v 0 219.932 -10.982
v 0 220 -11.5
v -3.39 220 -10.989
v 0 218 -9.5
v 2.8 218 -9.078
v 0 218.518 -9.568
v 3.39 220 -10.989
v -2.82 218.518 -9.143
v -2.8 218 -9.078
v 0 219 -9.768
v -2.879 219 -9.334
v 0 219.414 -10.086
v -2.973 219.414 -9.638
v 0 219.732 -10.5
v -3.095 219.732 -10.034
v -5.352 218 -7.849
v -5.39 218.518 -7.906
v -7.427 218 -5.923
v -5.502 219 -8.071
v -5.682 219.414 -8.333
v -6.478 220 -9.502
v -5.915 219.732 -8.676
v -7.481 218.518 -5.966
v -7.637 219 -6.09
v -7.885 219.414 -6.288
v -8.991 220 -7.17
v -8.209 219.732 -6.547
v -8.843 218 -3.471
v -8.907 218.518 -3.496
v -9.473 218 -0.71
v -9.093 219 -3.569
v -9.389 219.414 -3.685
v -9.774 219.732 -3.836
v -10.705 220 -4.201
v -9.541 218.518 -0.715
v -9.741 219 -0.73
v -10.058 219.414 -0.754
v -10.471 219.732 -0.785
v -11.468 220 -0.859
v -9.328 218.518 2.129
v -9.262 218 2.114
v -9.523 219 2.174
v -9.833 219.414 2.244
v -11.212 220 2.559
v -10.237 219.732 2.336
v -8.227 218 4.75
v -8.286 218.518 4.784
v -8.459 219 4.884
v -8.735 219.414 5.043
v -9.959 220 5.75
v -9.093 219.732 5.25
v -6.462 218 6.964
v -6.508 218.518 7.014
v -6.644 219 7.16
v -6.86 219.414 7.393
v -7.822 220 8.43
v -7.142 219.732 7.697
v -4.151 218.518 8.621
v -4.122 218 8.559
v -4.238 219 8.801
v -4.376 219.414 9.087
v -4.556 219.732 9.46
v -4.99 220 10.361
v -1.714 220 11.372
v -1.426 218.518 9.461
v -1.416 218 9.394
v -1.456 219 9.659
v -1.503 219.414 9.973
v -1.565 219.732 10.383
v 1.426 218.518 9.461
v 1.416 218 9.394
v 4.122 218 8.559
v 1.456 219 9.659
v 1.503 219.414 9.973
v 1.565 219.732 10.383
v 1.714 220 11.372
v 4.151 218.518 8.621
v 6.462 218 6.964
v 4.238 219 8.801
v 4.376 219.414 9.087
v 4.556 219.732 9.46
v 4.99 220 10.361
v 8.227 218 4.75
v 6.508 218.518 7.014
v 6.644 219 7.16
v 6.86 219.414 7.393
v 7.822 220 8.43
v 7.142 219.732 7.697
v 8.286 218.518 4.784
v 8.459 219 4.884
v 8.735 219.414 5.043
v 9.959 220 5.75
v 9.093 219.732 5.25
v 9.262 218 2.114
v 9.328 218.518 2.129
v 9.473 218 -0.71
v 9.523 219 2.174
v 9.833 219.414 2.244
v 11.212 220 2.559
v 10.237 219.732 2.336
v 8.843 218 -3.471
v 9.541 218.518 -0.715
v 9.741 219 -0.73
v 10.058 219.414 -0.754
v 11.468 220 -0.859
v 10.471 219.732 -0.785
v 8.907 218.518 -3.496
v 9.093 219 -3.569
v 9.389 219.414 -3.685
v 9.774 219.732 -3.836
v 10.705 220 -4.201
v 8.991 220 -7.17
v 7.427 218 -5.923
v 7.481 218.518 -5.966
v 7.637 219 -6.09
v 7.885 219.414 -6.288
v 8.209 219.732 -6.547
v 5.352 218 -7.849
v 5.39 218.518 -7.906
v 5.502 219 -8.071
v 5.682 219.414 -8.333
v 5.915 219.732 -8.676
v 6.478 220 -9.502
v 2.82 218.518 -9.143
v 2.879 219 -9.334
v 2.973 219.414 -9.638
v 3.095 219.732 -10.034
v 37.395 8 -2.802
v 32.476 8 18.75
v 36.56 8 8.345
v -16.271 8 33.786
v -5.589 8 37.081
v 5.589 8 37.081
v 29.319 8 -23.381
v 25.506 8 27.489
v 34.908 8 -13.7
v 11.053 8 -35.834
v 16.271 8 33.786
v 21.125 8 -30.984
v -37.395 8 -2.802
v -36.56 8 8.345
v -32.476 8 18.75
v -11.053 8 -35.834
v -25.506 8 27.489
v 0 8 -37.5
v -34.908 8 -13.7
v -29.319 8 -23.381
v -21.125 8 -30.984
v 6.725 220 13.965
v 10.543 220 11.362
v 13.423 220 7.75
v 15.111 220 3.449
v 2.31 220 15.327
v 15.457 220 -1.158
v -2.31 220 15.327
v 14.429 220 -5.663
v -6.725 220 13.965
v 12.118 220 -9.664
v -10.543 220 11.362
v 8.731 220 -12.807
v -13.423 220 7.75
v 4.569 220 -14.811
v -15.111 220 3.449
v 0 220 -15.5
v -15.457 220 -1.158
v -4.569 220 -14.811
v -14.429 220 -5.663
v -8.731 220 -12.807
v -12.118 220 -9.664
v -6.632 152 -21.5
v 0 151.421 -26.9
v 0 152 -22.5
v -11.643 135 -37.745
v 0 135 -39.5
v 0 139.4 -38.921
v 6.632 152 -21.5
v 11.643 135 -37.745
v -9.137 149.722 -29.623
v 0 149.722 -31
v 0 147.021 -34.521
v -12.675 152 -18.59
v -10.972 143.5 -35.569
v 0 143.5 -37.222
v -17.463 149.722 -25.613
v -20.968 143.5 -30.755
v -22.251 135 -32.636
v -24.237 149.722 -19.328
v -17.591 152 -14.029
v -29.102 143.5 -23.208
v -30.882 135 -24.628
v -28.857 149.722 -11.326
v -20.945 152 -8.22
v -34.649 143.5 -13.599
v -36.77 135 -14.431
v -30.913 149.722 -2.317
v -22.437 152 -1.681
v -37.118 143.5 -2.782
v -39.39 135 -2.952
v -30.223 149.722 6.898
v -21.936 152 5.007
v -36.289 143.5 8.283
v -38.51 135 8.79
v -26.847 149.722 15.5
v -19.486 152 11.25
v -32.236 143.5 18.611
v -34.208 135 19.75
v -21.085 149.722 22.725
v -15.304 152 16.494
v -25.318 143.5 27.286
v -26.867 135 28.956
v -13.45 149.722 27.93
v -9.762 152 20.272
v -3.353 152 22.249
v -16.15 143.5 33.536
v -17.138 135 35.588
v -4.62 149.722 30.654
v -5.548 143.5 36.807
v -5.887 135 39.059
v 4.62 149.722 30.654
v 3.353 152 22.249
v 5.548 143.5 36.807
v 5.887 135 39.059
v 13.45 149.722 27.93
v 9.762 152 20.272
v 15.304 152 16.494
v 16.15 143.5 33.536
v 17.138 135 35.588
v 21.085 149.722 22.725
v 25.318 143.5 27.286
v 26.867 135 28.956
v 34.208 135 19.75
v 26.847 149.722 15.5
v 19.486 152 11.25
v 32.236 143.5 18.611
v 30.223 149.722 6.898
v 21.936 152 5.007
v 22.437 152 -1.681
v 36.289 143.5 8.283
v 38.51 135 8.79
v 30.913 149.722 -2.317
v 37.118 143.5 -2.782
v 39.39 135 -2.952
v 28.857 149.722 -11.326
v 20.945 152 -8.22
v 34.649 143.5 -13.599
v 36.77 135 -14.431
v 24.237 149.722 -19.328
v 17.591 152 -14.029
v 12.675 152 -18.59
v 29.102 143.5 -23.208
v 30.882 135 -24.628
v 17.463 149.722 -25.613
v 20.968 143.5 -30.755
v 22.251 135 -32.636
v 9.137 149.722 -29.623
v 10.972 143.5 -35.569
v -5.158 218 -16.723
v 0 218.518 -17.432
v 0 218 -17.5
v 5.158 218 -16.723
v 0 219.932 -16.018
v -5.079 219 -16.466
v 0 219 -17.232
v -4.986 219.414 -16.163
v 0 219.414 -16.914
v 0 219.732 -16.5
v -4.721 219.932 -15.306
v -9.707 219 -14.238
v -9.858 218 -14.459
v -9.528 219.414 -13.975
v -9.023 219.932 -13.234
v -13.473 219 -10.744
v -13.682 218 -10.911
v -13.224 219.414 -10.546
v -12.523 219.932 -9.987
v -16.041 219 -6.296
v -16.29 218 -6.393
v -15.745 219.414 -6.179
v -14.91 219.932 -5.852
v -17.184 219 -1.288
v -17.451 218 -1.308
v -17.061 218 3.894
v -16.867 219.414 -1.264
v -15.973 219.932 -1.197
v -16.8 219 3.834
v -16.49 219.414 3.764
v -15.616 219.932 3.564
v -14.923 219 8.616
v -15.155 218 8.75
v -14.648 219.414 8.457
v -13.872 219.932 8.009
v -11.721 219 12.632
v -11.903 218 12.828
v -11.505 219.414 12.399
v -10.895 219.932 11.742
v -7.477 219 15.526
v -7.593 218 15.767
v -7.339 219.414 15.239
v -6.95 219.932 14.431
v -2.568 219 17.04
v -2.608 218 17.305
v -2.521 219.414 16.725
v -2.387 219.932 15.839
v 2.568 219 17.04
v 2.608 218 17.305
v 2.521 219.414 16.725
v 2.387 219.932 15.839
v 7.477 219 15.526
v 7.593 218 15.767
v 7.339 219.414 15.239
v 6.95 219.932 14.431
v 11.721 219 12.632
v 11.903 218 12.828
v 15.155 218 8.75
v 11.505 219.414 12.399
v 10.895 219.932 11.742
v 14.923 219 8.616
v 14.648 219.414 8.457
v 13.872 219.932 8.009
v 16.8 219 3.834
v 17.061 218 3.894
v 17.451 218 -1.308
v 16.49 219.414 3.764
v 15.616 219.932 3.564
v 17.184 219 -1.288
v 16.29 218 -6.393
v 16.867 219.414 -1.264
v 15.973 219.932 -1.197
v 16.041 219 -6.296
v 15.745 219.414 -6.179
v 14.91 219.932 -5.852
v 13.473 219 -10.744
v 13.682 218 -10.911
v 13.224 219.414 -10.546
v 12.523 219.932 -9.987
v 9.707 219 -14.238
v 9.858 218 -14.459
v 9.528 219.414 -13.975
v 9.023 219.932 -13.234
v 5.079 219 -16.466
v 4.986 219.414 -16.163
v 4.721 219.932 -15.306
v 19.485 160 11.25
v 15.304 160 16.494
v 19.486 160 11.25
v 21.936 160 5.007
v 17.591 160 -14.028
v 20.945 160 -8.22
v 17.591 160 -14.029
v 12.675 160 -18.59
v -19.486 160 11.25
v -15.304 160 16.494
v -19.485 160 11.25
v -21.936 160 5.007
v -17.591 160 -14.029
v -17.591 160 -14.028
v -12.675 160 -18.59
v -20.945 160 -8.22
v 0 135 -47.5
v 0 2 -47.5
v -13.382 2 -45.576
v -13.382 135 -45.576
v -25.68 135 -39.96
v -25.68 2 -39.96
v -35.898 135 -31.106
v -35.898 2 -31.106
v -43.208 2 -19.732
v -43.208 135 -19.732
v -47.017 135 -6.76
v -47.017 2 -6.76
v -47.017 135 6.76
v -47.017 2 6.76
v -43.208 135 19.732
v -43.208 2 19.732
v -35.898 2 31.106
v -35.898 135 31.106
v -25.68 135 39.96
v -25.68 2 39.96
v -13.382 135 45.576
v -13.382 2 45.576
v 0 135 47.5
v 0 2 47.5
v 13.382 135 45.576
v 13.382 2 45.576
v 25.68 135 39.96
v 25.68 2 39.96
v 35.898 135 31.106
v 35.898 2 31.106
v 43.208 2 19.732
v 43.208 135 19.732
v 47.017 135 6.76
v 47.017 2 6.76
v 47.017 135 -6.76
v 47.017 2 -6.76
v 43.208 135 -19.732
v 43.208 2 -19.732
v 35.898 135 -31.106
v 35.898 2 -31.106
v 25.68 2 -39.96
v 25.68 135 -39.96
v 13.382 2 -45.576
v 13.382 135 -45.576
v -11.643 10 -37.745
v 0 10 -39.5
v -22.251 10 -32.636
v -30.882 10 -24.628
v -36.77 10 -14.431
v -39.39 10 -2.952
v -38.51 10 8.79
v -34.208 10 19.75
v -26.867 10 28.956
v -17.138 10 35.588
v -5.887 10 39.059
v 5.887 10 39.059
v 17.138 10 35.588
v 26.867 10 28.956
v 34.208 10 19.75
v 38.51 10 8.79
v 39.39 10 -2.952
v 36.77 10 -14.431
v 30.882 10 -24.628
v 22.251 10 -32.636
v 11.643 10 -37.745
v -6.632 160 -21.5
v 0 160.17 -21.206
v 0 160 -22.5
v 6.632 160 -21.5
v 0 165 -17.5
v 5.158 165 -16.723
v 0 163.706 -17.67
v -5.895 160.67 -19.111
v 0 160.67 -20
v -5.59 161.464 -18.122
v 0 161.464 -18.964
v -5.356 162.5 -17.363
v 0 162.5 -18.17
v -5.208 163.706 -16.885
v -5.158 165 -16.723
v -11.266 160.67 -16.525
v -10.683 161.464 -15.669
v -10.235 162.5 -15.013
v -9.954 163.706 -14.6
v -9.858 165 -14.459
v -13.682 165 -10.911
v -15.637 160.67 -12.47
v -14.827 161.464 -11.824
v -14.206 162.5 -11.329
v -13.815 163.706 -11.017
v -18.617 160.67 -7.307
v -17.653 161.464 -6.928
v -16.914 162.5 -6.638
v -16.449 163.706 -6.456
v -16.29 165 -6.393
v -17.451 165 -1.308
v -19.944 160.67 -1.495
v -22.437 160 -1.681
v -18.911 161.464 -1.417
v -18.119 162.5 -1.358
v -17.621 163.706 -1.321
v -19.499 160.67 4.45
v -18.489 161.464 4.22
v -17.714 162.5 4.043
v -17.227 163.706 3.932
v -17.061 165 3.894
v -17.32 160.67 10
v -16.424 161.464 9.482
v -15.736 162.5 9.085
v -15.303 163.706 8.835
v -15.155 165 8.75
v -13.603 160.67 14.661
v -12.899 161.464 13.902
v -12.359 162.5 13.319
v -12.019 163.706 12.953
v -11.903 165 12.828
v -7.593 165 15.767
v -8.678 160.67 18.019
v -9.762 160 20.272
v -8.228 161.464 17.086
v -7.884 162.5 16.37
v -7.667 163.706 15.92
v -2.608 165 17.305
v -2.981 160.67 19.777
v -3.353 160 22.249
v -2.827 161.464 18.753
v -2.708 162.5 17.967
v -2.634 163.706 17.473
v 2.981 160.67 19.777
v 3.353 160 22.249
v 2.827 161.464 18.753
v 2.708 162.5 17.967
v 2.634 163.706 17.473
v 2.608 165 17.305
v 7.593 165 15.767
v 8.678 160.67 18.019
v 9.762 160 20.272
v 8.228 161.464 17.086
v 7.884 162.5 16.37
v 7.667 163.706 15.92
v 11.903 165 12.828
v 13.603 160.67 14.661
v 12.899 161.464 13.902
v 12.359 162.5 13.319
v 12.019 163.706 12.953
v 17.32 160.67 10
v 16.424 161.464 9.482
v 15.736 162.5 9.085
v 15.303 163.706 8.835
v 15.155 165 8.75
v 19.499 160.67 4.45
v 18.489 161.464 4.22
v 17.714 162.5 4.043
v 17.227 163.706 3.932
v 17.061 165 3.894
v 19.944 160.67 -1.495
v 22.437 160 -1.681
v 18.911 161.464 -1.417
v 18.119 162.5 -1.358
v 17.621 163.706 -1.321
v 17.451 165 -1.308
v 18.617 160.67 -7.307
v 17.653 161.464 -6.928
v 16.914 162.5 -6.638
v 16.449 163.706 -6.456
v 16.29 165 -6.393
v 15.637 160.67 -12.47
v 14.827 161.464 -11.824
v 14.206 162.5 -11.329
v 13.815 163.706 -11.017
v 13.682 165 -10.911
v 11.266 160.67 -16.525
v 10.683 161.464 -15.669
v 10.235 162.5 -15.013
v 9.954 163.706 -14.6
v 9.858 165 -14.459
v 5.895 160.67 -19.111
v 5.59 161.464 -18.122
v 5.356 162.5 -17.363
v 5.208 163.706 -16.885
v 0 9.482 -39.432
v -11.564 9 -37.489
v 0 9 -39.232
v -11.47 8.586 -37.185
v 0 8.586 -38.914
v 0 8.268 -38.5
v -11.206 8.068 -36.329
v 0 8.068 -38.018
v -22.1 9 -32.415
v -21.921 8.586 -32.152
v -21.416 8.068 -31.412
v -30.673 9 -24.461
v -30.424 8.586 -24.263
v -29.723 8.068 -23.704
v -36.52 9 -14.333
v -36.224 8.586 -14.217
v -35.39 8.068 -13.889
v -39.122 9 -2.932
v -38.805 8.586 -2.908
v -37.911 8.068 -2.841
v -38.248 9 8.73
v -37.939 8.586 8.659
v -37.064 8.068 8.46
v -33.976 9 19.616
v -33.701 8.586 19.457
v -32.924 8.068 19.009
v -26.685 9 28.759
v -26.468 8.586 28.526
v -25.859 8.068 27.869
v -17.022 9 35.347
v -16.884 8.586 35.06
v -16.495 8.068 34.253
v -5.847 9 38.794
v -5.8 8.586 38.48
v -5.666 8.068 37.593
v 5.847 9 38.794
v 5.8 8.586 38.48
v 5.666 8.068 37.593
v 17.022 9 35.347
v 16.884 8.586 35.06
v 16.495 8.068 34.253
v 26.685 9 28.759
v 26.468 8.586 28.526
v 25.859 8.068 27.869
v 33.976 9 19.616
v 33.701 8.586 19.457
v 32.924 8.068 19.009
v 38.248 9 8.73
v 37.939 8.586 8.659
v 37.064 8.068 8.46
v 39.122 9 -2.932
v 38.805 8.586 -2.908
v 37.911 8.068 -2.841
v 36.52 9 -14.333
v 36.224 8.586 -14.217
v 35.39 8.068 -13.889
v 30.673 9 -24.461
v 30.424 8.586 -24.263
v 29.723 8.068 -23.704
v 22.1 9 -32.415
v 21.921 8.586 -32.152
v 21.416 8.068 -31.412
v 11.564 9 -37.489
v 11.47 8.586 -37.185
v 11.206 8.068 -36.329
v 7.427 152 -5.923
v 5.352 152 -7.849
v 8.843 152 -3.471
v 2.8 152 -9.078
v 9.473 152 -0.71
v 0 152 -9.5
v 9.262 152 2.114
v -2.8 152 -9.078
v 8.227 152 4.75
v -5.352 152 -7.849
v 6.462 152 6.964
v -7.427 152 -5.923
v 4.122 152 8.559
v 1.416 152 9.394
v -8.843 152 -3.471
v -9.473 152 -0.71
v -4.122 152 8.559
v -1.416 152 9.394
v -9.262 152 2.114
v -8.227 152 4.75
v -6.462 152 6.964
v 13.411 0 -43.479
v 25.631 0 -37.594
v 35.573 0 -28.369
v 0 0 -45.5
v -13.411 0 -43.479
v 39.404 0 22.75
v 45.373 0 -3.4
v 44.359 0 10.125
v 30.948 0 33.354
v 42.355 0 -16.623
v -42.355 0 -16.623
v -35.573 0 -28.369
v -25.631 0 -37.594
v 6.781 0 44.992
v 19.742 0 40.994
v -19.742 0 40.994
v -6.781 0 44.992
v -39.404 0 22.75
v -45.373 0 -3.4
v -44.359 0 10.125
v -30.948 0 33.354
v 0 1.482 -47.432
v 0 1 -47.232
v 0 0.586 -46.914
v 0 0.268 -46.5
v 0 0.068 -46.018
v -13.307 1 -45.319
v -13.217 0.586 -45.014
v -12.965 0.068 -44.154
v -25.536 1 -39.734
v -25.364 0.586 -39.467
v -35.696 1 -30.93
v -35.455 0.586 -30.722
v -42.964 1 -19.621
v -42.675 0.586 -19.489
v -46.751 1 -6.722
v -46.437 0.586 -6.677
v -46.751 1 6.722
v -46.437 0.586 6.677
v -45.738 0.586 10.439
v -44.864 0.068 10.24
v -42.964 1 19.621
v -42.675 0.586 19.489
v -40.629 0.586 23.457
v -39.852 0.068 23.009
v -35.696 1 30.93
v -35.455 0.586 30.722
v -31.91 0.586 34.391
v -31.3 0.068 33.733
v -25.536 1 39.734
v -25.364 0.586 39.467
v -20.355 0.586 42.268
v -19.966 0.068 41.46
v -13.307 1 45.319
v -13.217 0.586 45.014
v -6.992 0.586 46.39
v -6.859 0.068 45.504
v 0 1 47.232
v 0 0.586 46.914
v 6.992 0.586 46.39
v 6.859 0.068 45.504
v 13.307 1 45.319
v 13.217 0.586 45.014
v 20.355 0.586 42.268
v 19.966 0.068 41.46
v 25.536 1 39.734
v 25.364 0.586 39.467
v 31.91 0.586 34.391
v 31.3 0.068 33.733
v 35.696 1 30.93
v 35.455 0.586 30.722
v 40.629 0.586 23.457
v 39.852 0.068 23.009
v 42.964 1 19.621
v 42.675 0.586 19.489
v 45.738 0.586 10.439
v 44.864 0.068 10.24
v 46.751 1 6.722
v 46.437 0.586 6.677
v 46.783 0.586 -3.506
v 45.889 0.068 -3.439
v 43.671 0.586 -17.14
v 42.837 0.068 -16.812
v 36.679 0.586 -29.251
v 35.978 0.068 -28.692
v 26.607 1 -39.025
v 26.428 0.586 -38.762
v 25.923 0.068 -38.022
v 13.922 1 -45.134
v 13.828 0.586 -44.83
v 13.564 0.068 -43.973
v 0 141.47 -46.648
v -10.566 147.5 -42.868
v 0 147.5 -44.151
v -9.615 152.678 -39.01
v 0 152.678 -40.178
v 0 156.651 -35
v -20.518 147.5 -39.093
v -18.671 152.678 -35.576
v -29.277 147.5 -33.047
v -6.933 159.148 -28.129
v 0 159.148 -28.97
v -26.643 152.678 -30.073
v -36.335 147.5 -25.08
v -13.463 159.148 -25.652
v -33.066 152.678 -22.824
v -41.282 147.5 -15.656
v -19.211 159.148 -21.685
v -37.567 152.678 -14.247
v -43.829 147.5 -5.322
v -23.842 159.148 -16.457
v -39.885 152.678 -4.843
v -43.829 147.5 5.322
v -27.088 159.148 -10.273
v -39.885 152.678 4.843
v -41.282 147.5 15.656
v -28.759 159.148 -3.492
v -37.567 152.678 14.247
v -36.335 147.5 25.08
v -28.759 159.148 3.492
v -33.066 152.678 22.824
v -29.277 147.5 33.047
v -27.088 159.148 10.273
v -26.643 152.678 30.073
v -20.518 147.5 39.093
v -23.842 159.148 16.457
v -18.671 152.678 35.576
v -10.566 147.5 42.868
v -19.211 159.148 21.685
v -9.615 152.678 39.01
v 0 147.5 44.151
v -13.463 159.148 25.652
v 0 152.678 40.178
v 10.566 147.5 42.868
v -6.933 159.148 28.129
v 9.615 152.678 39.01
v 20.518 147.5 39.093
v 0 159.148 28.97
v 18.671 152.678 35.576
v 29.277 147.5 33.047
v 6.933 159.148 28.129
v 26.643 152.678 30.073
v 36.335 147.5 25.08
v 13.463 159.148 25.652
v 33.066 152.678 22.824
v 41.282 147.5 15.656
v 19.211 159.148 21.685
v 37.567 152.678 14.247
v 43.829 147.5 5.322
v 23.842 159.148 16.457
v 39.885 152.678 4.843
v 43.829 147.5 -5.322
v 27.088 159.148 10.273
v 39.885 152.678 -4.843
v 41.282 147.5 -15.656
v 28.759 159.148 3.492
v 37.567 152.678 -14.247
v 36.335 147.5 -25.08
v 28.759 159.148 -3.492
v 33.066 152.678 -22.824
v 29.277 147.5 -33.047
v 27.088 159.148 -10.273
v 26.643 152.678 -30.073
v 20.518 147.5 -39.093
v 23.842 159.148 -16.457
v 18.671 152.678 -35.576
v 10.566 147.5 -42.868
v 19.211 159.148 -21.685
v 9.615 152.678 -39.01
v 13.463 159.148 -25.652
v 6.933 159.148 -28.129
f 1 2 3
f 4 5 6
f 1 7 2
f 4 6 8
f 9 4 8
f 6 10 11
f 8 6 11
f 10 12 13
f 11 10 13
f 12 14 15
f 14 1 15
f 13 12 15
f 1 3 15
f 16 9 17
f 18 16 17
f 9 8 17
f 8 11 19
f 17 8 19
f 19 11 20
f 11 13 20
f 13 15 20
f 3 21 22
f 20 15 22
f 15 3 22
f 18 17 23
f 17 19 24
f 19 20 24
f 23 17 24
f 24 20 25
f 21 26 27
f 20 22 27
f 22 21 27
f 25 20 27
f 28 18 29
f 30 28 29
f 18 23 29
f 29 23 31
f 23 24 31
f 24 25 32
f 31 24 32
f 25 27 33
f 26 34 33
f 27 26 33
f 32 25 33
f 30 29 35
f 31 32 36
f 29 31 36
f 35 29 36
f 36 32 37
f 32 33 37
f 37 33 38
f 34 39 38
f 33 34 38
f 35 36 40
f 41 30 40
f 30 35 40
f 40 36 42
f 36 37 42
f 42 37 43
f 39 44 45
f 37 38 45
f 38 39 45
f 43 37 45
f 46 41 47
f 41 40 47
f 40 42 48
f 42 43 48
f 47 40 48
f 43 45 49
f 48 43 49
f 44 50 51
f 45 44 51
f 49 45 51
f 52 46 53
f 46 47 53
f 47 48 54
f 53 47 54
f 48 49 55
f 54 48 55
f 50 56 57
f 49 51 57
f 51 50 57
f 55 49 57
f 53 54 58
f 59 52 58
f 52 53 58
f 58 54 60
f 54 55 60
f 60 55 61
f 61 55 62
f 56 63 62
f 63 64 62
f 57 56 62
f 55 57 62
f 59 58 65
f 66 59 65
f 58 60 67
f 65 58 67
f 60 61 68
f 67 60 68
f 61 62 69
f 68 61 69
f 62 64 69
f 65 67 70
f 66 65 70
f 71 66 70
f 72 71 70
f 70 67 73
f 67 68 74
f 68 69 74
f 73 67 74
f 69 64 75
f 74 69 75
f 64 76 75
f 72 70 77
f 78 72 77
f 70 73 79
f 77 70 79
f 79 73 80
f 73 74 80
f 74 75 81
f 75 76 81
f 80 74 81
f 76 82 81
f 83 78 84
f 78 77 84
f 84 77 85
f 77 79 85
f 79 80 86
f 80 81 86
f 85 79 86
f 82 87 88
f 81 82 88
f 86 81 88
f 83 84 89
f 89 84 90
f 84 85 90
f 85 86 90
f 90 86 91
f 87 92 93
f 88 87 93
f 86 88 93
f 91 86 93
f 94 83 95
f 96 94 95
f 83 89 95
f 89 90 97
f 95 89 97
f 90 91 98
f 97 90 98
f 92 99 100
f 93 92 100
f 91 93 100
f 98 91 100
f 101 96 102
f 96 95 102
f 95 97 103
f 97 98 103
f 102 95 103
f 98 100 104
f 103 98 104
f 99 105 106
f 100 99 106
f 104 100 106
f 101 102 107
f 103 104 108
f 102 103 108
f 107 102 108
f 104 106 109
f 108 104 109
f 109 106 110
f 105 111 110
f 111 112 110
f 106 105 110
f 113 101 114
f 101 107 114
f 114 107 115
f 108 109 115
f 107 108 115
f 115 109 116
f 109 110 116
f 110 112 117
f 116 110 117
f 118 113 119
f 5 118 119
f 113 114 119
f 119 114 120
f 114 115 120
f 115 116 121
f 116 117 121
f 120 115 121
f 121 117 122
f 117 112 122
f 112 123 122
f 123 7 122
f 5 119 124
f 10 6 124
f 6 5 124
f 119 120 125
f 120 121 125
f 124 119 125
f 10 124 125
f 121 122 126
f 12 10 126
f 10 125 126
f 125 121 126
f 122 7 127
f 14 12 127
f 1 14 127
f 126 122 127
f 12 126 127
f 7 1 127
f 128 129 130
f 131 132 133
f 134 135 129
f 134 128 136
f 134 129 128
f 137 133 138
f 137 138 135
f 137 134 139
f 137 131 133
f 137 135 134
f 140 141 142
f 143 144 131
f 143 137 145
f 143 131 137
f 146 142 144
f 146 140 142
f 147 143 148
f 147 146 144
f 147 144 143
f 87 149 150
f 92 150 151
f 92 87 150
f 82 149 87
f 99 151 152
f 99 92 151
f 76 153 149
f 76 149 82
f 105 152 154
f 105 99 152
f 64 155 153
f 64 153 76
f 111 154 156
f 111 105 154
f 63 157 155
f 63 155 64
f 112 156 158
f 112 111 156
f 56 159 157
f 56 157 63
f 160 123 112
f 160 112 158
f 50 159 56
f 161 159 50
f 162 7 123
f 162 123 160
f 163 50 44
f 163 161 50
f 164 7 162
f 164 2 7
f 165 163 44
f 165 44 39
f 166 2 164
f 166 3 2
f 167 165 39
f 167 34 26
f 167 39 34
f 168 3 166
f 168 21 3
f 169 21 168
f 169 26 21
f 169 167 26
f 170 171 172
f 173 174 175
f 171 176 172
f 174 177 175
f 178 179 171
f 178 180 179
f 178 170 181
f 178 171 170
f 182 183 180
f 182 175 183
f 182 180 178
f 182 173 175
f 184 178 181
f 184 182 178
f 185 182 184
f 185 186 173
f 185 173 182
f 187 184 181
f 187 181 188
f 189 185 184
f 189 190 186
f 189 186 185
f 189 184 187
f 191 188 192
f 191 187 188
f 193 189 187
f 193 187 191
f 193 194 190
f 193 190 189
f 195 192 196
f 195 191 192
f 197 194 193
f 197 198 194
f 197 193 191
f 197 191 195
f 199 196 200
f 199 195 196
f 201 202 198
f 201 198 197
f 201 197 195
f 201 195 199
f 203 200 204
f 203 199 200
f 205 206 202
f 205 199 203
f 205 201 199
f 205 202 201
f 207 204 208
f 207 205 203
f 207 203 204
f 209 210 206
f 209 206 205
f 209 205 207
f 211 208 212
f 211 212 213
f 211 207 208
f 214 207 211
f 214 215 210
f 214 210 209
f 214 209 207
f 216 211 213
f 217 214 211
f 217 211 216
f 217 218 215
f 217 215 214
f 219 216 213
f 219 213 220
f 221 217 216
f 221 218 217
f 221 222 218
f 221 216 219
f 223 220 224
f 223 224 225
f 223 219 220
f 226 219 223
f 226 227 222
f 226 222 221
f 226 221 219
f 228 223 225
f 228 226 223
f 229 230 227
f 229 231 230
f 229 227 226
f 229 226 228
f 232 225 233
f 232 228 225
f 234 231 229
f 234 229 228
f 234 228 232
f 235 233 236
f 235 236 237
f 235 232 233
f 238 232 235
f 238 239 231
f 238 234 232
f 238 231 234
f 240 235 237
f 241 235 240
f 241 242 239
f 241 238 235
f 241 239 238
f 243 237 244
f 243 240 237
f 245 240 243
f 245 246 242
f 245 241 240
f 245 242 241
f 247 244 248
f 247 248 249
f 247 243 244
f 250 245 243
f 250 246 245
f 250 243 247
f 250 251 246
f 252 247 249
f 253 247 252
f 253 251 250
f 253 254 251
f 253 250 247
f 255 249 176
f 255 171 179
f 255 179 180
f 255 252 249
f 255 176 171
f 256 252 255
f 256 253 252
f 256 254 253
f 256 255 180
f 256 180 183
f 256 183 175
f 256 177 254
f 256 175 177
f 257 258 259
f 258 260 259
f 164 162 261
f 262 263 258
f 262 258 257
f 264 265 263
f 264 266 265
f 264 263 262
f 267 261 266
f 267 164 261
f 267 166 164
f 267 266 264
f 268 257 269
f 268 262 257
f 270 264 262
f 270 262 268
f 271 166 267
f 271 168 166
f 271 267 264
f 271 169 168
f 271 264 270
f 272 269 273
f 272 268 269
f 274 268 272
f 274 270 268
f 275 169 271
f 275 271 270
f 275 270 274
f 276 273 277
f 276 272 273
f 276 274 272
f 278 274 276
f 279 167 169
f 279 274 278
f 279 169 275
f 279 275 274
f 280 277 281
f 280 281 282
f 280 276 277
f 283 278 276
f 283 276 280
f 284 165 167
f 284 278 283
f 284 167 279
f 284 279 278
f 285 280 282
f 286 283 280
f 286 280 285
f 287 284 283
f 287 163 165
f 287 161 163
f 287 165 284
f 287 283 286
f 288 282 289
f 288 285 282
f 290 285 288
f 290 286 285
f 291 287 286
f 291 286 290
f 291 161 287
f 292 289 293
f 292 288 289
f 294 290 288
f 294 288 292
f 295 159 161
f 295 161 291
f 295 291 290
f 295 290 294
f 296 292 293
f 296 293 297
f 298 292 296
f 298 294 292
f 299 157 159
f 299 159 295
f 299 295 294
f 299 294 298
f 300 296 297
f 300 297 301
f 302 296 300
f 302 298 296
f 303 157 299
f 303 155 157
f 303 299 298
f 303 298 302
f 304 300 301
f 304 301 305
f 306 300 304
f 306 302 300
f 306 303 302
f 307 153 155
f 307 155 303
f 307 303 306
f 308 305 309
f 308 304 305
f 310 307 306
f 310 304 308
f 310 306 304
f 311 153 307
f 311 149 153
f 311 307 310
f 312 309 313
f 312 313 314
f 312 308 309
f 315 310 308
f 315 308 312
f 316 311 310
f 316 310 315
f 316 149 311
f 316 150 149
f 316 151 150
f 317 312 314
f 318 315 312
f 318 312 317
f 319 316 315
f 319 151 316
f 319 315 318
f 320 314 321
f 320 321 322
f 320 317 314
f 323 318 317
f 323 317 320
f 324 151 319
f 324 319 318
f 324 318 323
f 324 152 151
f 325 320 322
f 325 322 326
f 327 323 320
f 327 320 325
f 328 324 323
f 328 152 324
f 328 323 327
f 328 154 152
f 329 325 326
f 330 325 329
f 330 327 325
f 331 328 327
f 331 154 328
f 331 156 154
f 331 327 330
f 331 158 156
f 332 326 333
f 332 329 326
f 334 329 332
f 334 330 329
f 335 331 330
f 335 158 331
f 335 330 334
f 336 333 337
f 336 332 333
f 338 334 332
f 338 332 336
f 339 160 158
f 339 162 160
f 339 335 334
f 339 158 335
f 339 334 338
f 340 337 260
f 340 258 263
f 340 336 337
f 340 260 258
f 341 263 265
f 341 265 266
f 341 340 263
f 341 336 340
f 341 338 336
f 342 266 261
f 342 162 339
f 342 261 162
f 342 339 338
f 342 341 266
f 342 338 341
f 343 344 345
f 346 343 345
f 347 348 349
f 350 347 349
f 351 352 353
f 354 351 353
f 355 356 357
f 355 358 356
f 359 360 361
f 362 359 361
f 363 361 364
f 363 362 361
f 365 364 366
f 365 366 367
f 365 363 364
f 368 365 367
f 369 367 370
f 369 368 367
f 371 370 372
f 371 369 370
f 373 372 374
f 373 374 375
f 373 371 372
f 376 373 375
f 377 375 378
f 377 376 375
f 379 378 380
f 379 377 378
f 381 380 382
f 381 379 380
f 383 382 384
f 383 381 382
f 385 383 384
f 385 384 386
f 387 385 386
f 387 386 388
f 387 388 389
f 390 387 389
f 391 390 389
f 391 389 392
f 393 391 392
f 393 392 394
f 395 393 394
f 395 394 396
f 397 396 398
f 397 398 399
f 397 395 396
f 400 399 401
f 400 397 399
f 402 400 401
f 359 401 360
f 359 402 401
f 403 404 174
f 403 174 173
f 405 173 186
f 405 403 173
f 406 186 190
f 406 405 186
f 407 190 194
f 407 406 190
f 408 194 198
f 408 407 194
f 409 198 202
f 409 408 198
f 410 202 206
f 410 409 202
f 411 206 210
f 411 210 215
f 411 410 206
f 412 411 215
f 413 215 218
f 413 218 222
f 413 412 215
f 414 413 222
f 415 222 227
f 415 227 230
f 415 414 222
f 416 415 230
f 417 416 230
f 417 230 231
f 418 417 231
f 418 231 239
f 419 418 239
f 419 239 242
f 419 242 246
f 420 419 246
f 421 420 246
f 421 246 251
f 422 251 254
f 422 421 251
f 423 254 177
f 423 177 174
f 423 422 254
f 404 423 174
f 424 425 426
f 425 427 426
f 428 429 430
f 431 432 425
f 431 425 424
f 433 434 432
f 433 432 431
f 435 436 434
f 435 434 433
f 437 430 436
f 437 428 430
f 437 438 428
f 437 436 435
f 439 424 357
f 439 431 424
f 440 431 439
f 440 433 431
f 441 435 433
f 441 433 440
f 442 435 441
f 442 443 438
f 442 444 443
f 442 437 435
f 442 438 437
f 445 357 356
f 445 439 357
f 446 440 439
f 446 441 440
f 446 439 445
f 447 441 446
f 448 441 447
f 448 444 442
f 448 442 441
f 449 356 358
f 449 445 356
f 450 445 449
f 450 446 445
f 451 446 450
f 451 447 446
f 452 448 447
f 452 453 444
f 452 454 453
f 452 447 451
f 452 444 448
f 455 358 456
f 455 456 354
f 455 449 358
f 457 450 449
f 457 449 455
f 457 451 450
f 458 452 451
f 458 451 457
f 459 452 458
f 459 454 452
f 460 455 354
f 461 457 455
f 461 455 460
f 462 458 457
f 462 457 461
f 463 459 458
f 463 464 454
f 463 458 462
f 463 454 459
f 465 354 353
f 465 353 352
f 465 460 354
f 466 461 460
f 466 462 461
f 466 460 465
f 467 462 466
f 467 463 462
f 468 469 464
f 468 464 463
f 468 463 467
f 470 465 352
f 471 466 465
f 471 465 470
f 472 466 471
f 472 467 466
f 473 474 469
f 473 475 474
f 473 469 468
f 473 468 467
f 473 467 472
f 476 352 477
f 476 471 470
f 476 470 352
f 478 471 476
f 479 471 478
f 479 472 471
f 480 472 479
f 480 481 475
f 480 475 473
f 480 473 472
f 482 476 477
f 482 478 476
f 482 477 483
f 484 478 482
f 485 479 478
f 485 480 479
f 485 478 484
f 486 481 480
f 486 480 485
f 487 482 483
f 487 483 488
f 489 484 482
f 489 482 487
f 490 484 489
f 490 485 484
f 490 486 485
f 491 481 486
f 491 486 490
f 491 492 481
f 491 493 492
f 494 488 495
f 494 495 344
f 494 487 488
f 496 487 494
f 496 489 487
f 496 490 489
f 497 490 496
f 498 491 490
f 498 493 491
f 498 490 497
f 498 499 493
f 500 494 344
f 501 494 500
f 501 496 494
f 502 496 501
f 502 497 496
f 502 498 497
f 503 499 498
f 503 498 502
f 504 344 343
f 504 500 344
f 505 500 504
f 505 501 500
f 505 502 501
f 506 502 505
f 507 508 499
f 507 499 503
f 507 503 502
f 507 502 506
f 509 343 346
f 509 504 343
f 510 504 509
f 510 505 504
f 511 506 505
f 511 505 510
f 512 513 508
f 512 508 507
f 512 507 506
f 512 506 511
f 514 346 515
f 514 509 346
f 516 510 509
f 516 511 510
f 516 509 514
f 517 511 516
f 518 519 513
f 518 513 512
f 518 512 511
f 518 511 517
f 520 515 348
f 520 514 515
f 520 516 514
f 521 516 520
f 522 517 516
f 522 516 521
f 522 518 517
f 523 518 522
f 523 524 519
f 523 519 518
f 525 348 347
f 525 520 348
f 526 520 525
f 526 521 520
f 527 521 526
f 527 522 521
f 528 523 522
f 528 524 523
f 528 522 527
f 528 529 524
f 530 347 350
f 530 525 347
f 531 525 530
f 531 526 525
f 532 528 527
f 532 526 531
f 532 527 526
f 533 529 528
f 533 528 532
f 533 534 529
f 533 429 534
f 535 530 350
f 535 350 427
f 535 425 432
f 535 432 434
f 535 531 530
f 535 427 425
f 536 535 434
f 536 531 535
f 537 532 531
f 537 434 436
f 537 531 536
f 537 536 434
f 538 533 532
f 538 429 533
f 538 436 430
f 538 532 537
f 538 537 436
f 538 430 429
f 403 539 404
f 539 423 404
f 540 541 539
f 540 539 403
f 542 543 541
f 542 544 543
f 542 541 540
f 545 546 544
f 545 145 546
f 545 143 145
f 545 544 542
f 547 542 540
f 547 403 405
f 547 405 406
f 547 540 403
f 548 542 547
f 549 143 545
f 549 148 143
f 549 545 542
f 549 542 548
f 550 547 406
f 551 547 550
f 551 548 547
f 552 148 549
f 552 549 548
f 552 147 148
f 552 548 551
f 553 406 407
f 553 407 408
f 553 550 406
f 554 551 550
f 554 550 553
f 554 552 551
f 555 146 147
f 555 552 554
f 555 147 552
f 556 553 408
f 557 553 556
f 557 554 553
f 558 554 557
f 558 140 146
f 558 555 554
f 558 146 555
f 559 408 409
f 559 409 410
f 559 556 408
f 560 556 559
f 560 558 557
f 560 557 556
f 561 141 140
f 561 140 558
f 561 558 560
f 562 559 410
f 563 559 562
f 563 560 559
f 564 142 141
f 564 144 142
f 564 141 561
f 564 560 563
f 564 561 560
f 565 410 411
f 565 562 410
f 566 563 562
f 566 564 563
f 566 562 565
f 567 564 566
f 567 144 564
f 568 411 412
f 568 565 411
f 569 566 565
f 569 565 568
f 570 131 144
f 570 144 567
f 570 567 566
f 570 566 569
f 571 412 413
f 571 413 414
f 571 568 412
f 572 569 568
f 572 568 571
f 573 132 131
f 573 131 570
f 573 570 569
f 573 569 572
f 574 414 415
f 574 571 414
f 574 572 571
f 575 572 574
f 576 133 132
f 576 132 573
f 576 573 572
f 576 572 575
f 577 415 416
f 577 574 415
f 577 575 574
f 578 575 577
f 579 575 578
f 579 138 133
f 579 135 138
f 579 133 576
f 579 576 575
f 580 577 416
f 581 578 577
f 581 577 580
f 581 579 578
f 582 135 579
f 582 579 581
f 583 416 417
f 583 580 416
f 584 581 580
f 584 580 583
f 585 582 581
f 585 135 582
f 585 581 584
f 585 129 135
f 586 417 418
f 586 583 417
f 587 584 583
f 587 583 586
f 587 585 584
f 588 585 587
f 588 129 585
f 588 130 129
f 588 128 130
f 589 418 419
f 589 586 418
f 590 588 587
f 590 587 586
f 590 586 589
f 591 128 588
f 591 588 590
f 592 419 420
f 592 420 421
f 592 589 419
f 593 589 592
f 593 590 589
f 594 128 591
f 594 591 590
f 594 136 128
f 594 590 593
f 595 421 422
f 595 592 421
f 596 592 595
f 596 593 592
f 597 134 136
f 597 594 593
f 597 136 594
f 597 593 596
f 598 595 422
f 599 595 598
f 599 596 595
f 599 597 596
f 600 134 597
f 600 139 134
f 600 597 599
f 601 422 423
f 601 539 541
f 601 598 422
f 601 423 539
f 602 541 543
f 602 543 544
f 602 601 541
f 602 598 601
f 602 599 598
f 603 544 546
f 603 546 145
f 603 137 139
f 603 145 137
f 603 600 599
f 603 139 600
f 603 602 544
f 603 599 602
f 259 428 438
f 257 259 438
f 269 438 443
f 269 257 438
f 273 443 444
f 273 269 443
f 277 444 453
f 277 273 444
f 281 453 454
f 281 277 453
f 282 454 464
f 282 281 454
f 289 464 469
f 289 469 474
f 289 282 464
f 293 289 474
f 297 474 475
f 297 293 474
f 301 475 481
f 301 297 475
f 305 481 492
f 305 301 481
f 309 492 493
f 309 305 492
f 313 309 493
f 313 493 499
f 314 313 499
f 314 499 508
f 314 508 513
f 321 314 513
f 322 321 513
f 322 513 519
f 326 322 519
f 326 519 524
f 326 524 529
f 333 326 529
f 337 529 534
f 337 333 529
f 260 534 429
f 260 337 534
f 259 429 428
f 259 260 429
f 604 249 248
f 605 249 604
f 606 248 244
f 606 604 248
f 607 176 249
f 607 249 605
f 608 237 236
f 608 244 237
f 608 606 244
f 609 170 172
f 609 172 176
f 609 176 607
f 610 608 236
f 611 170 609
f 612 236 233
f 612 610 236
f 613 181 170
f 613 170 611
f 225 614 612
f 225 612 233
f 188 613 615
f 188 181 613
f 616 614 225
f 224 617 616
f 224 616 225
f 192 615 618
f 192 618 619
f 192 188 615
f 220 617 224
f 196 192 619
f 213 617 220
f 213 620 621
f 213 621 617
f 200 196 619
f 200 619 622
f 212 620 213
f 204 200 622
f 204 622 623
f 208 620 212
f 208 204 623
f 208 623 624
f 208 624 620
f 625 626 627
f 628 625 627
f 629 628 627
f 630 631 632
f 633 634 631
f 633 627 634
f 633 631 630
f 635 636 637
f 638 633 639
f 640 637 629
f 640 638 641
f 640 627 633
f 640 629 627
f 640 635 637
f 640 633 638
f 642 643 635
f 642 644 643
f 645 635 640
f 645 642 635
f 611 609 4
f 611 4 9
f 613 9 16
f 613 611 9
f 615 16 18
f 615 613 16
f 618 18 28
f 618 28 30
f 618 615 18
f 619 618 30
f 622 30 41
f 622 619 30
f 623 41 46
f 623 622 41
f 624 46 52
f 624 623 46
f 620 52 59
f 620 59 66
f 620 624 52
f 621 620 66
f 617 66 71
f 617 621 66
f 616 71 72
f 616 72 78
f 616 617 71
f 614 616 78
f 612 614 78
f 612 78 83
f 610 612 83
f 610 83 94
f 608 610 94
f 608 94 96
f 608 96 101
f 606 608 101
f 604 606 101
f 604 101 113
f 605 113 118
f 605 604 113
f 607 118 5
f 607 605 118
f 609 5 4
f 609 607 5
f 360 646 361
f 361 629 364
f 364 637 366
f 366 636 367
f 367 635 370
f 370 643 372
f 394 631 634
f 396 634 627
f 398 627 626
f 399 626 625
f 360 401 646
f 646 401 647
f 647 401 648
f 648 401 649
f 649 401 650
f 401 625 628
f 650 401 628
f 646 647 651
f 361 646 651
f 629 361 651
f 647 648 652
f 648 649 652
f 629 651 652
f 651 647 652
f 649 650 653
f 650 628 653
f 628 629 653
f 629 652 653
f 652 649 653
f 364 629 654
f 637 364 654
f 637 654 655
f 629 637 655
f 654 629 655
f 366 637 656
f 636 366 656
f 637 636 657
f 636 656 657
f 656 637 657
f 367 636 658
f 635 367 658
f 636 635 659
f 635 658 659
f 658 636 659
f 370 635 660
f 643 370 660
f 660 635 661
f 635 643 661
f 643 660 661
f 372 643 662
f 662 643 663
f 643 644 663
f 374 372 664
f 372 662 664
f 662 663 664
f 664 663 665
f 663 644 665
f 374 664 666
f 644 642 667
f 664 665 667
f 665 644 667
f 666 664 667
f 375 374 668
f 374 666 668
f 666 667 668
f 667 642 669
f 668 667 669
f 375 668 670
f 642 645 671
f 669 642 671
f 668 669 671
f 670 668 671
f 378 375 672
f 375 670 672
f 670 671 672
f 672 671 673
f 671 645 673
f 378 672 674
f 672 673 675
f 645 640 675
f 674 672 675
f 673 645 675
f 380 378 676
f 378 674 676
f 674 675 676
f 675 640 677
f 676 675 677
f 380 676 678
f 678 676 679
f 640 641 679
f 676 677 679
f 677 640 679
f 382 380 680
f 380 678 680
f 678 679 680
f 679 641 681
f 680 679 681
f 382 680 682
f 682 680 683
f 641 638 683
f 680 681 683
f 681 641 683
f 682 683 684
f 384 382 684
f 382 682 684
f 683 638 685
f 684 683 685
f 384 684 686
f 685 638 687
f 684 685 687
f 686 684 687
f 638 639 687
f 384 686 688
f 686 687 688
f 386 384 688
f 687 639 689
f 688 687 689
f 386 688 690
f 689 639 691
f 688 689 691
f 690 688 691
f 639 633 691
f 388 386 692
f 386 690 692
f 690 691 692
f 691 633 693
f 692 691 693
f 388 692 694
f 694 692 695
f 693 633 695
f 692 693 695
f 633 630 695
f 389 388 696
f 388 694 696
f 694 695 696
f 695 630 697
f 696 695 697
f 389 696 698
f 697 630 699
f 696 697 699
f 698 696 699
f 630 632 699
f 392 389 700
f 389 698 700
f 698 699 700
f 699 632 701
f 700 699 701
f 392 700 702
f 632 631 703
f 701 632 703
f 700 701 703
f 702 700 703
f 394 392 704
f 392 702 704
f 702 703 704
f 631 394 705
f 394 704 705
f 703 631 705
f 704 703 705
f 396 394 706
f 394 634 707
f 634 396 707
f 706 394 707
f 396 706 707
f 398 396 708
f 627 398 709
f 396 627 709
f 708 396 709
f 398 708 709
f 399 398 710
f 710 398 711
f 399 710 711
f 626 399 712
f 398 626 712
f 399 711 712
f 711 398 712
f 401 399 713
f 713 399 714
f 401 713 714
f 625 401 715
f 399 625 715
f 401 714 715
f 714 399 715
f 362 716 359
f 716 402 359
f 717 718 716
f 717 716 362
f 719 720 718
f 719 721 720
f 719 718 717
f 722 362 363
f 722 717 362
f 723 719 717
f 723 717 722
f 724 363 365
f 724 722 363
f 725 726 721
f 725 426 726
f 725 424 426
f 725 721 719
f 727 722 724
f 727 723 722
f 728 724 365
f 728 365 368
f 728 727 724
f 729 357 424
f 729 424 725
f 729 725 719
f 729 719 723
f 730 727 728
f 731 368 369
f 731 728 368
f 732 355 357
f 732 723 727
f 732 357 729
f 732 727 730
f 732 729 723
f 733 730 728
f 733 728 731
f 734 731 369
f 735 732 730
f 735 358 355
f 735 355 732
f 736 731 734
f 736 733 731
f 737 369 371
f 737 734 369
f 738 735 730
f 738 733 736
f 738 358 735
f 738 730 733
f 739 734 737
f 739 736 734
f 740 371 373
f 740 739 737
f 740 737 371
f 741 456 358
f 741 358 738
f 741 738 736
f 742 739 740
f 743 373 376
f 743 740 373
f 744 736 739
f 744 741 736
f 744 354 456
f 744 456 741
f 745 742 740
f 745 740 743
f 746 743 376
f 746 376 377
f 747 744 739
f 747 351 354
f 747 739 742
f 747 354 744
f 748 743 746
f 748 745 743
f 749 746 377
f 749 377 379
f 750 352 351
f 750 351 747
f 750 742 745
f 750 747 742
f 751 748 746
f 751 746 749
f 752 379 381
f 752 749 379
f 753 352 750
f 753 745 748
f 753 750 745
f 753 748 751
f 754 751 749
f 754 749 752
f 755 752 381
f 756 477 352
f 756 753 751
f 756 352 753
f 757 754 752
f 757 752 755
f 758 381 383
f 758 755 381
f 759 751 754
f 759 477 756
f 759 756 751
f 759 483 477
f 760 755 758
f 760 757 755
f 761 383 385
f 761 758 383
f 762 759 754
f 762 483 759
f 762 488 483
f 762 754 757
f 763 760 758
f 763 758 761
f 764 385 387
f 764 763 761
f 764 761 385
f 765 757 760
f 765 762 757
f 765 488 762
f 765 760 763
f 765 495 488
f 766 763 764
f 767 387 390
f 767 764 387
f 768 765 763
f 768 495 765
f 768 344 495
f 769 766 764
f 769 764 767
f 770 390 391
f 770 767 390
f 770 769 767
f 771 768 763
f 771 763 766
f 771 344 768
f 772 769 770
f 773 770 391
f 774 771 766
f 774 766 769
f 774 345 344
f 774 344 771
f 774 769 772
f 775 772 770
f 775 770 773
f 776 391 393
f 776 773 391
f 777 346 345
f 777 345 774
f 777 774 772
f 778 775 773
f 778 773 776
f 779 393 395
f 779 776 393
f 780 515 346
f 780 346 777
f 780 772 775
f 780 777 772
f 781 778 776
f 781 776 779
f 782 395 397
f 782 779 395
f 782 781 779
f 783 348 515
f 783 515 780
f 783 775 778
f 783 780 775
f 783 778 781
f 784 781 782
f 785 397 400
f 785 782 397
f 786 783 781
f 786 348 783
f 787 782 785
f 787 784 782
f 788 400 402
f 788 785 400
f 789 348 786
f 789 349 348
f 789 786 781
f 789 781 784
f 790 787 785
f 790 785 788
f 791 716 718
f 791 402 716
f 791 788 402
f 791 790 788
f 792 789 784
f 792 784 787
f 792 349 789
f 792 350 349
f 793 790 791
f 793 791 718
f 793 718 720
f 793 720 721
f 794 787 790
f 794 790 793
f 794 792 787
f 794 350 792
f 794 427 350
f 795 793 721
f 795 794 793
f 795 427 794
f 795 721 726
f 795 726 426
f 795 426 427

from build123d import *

# Parameters (mm, degrees)
FILLET1_R = 25
FILLET2_R = 5
FILLET3_R = 2
FILLET4_R = 2
FILLET5_R = 17
FILLET6_R = 2
FILLET7_R = 2


with BuildPart() as part:
    # Sketch2 → Revolve1 (revolve)
    with BuildSketch(Plane.XY, mode=Mode.PRIVATE) as revolve1_sk:
        Polygon((0, 0), (47.5, 0), (47.5, 160), (17.5, 160), (17.5, 220), (9.5, 220), (9.5, 152), (39.5, 152), (39.5, 8), (0, 8), align=None)
    revolve(revolve1_sk.sketch.rotate(Axis((0, 0, 0), (0, 1, 0)), 90), axis=Axis((0, 0, 0), (0, 1, 0)))

    # Fillet1
    fillet1_edges = [part.edges().sort_by_distance(p)[0] for p in [
        (0, 160, 47.5),
    ]]
    fillet(fillet1_edges, radius=FILLET1_R)

    # Fillet2
    fillet2_edges = [part.edges().sort_by_distance(p)[0] for p in [
        (0, 160, 17.5),
    ]]
    fillet(fillet2_edges, radius=FILLET2_R - 0.0001)  # a hair under: the kernel refuses the full size

    # Fillet3
    fillet3_edges = [part.edges().sort_by_distance(p)[0] for p in [
        (0, 220, 17.5),
    ]]
    fillet(fillet3_edges, radius=FILLET3_R)

    # Fillet4
    fillet4_edges = [part.edges().sort_by_distance(p)[0] for p in [
        (0, 0, 47.5),
    ]]
    fillet(fillet4_edges, radius=FILLET4_R)

    # Fillet5
    fillet5_edges = [part.edges().sort_by_distance(p)[0] for p in [
        (0, 152, 39.5),
    ]]
    fillet(fillet5_edges, radius=FILLET5_R)

    # Fillet6
    fillet6_edges = [part.edges().sort_by_distance(p)[0] for p in [
        (0, 8, 39.5),
    ]]
    fillet(fillet6_edges, radius=FILLET6_R)

    # Fillet7
    fillet7_edges = [part.edges().sort_by_distance(p)[0] for p in [
        (0, 220, 9.5),
    ]]
    fillet(fillet7_edges, radius=FILLET7_R)


solid = part.part
